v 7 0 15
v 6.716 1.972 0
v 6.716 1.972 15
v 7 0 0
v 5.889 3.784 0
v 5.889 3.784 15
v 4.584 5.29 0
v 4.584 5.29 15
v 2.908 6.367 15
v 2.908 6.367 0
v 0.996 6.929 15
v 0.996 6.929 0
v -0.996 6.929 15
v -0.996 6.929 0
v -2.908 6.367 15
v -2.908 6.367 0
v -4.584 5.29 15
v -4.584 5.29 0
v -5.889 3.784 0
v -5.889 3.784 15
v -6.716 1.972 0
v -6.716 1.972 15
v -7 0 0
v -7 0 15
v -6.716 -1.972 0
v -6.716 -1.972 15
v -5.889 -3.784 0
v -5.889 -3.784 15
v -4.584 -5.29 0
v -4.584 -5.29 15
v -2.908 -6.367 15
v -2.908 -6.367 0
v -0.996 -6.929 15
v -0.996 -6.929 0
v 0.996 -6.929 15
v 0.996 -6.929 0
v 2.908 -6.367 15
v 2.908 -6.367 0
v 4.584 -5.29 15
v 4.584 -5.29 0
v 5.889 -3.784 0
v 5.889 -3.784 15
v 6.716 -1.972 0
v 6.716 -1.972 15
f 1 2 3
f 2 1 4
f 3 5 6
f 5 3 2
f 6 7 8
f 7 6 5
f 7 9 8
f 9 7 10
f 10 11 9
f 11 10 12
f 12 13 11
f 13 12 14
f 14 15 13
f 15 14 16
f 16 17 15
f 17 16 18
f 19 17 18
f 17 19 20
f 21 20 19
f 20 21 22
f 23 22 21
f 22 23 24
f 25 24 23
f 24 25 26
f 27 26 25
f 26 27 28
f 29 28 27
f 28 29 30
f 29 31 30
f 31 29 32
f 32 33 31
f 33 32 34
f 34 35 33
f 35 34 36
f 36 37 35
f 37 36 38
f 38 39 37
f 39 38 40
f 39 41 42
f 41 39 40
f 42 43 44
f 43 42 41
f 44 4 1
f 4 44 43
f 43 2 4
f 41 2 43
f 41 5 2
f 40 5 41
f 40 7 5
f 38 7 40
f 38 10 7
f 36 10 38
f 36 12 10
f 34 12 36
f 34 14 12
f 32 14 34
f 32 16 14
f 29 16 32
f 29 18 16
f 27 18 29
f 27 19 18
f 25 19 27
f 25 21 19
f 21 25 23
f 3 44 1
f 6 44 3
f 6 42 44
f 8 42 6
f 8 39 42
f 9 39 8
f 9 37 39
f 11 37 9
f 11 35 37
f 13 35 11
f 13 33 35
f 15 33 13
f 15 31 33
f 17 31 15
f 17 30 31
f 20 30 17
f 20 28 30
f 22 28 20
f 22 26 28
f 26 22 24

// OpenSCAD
// Generated by SolidPython 1.0.1 on 2020-07-29 00:46:44


cylinder(h = 15, r1 = 7, r2 = 7);
/***********************************************
*********      SolidPython code:      **********
************************************************
 
# import packages: SolidPython
from solid import *
from solid.utils import *
from itertools import chain, combinations, permutations


class Resize:

    def __init__(self, scad_file):
        self.scad_file = scad_file
        #self.scad_file = import_scad(scad_file)
        # cone/cylinder param:
        self.r1 = 0
        self.r2 = 0
        self.h = 0
        # rectangular prism param:
        self.w = 0
        self.l = 0
        # ellipse param:
        self.r = 0

    # import OpenScad code (file name corresponds to shape)


    # classify shape + parameters
    def assign(self, param1, param2, param3):
        if self.scad_file == 'cone.scad':
            self.r1 = param1
            self.r2 = param2
            self.h = param3
        elif self.scad_file == 'cylinder.scad':
            self.r1 = param1
            self.r2 = param2
            self.h = param3
        elif self.scad_file == 'rectangularPrism.scad':
            self.h = param1
            self.l = param2
            self.w = param3
        else:
            self.r = param1
            self.h = param2

    # resize parameters
    def iterate(self):
        x = range(3, 20, 2)
        i = 1
        if self.scad_file == 'cone.scad':
            tempList = list(permutations(x, 2))
            for temp in tempList:
                param1 = temp[0]
                param2 = temp[1]
                filepath = 'produced_scad_files/' + 'cone' + str(param1) + '_' + str(param2) + '_' + '.scad'
                scad_render_to_file(cylinder(h=param1, r1=param2, r2=0), filepath)

        elif self.scad_file == 'cylinder.scad':
            tempList = list(permutations(x, 3))
            for temp in tempList:
                param1 = temp[0]
                param2 = temp[1]
                filepath = 'produced_scad_files/' + 'cylinder' + str(param1) + '_' + str(param2) + '_' + '.scad'
                scad_render_to_file(cylinder(h=param1, r1=param2, r2=param2), filepath)

        elif self.scad_file == 'rectangularPrism.scad':
            tempList = list(permutations(x, 3))
            for temp in tempList:
                param1 = temp[0]
                param2 = temp[1]
                param3 = temp[2]
                filepath = 'produced_scad_files/' + 'rectangularPrism' + str(param1) + '_' + str(param2) + '_' + str(
                    param3) + '.scad'
                scad_render_to_file(cube(size=(param1, param2, param3)), filepath)

        elif self.scad_file == 'ellipse.scad':
            tempList = list(permutations(x, 4))
            for temp in tempList:
                param1 = temp[0]
                param2 = temp[1]
                param3 = temp[2]
                param4 = temp[3]
                filepath = 'produced_scad_files/' + 'ellipse' + str(param1) + '_' + str(param2) + '_' + str(param3) + '_' + str(param4) + '.scad'
                scad_render_to_file(scale([param1, param2, param3])(sphere(r=param4)), filepath)

    def render_to_scadfile(self):
        scad_render_to_file(scad, 'example.scad') 
 
************************************************/
